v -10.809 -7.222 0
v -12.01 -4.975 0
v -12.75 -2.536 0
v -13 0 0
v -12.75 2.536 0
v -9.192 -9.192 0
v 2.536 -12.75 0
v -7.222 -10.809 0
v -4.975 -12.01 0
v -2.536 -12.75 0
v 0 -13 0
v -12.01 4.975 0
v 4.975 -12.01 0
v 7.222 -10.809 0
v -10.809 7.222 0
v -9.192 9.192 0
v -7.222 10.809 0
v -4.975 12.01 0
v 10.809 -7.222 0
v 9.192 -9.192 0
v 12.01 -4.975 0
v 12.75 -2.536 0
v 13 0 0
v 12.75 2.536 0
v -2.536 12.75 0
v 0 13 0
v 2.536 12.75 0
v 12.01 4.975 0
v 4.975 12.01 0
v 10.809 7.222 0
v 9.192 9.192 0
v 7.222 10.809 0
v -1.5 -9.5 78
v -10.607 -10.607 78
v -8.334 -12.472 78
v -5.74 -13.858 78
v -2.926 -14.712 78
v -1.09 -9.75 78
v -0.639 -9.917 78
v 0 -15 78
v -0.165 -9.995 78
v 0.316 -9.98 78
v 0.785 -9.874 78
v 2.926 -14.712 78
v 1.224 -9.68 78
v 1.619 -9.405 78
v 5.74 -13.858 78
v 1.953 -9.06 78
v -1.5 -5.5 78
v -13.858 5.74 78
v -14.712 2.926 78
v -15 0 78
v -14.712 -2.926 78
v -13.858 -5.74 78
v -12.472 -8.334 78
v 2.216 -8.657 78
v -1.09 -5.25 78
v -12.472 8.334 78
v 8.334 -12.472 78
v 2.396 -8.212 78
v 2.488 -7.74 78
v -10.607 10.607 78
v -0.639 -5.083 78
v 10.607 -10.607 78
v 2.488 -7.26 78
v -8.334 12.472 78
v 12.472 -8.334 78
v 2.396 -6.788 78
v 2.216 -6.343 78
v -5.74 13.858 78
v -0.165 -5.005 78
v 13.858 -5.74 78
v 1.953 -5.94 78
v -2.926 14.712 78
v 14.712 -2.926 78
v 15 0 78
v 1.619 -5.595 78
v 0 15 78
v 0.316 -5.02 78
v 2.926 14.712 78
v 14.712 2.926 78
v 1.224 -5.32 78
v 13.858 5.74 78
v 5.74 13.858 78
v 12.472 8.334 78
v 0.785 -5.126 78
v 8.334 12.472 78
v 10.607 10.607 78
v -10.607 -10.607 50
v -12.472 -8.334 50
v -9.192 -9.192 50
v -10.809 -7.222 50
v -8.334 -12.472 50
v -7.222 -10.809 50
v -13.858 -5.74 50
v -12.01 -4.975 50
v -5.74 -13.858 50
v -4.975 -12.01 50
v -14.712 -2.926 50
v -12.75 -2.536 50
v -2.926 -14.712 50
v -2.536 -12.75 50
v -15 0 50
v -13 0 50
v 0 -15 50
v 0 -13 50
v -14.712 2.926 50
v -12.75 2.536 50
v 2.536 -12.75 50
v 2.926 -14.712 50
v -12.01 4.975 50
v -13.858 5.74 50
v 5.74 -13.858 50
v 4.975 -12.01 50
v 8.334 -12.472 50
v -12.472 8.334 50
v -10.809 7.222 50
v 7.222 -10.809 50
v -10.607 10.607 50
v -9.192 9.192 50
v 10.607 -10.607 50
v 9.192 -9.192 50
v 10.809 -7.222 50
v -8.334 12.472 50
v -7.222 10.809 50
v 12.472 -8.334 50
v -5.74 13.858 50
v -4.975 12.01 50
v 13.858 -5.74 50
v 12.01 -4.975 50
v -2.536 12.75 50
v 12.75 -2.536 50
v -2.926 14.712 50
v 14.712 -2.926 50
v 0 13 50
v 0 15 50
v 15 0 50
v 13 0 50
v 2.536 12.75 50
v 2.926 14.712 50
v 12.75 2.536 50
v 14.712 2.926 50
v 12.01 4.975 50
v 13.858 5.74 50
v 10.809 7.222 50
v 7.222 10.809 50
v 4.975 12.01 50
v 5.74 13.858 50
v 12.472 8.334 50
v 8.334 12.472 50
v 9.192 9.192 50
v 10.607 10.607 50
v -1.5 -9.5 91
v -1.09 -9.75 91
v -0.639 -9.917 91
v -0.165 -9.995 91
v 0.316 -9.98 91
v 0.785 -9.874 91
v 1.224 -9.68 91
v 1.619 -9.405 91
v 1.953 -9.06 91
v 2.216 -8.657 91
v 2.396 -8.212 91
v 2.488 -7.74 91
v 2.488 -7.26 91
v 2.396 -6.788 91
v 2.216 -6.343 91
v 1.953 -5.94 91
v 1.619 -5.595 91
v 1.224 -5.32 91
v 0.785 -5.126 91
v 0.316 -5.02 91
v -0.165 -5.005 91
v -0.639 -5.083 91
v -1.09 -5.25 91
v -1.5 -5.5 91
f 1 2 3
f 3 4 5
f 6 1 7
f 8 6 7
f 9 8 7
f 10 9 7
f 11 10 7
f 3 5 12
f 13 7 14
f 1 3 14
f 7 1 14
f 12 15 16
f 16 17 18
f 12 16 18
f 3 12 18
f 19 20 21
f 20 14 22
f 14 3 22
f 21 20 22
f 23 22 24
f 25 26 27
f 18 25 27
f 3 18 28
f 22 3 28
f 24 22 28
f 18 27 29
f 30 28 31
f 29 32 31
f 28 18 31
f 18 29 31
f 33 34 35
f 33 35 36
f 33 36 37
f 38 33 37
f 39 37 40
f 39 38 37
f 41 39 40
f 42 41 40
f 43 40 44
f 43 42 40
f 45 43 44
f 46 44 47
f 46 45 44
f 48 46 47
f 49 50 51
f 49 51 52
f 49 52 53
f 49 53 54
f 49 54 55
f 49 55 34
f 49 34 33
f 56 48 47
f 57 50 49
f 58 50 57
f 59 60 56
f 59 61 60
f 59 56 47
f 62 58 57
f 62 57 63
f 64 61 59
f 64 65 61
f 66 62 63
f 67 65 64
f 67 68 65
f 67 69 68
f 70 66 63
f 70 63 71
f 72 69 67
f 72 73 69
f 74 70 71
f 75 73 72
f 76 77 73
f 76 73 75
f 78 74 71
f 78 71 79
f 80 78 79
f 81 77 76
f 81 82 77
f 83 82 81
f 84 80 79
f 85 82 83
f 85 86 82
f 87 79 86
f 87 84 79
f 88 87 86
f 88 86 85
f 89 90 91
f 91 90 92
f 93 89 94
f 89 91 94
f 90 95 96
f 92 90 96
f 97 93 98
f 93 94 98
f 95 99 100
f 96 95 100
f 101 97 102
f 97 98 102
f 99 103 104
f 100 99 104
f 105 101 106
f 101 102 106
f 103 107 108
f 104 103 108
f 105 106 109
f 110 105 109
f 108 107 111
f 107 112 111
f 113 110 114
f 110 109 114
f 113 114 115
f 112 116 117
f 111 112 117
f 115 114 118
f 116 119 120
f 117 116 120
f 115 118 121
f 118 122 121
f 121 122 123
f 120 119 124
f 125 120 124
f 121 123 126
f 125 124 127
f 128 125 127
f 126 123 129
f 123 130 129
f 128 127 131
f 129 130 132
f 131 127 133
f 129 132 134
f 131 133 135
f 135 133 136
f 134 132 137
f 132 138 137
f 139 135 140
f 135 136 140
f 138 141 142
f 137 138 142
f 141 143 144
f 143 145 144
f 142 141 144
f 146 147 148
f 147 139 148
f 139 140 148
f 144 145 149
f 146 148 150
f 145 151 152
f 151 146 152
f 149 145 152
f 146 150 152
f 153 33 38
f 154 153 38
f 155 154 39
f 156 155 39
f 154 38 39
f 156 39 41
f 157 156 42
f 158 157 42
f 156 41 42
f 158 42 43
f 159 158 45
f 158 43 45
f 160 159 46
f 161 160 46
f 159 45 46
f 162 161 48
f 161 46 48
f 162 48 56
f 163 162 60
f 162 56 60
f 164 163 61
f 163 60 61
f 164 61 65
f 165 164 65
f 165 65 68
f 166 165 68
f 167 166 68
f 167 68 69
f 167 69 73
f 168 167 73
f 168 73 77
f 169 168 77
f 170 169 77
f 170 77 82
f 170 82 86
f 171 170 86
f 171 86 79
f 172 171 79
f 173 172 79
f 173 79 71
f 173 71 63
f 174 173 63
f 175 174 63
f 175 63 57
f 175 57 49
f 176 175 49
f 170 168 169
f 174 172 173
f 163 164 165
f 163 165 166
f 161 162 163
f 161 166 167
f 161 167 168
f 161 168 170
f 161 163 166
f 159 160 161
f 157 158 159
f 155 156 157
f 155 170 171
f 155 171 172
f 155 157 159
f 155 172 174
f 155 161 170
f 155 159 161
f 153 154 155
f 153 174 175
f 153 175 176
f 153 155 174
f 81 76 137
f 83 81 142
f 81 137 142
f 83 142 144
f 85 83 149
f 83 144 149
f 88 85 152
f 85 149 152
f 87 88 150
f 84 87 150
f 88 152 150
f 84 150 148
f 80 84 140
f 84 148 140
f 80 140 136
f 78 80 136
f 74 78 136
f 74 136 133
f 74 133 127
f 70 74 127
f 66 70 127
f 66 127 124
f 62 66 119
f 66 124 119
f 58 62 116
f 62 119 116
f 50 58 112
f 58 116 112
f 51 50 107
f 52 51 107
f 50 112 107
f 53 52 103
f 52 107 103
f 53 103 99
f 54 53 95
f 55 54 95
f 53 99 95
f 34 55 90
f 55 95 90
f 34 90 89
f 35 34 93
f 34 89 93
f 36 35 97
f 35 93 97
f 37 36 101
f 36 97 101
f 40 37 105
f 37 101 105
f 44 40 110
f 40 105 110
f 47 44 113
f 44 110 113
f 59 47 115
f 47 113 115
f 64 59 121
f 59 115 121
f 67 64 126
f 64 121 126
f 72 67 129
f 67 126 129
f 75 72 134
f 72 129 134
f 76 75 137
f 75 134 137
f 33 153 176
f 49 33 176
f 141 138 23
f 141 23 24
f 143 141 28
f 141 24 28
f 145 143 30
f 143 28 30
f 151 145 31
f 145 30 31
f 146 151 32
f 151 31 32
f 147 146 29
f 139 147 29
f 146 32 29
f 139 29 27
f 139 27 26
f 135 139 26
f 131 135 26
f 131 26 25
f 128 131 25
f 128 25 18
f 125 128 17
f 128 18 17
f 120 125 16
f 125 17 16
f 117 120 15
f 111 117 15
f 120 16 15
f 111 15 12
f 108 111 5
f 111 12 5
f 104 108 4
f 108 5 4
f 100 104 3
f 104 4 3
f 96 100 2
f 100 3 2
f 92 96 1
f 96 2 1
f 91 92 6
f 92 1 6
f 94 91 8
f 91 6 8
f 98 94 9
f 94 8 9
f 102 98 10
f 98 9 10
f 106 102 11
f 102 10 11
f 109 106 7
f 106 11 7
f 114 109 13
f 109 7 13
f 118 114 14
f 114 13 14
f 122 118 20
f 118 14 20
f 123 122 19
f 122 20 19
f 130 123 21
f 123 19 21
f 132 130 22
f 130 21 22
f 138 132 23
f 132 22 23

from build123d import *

# Parameters (mm, degrees)
SKETCH1_R           = 13
BOSS_EXTRUDE1_DEPTH = 50
SKETCH2_R           = 15
BOSS_EXTRUDE2_DEPTH = 28
SKETCH3_R           = 2.5
BOSS_EXTRUDE3_DEPTH = 13
SKETCH4_W           = 2
SKETCH4_H           = 4
CUT_EXTRUDE1_DEPTH  = 13


with BuildPart() as part:
    # Sketch1 → Boss-Extrude1 (new body)
    with BuildSketch(Plane.XY):
        Circle(SKETCH1_R)
    extrude(amount=BOSS_EXTRUDE1_DEPTH)

    # Sketch2 → Boss-Extrude2 (add)
    with BuildSketch(Plane.XY.offset(50)):
        Circle(SKETCH2_R)
    extrude(amount=BOSS_EXTRUDE2_DEPTH)

    # Sketch3 → Boss-Extrude3 (add)
    with BuildSketch(Plane.XY.offset(78)):
        with Locations(Location((0, -7.5, 0), (0, 0, 180))):
            Circle(SKETCH3_R)
    extrude(amount=BOSS_EXTRUDE3_DEPTH)

    # Sketch4 → Cut-Extrude1 (cut)
    with BuildSketch(Plane.XY.offset(91)):
        with Locations((-2.5, -7.5)):
            Rectangle(SKETCH4_W, SKETCH4_H)
    extrude(amount=-CUT_EXTRUDE1_DEPTH, mode=Mode.SUBTRACT)


solid = part.part
